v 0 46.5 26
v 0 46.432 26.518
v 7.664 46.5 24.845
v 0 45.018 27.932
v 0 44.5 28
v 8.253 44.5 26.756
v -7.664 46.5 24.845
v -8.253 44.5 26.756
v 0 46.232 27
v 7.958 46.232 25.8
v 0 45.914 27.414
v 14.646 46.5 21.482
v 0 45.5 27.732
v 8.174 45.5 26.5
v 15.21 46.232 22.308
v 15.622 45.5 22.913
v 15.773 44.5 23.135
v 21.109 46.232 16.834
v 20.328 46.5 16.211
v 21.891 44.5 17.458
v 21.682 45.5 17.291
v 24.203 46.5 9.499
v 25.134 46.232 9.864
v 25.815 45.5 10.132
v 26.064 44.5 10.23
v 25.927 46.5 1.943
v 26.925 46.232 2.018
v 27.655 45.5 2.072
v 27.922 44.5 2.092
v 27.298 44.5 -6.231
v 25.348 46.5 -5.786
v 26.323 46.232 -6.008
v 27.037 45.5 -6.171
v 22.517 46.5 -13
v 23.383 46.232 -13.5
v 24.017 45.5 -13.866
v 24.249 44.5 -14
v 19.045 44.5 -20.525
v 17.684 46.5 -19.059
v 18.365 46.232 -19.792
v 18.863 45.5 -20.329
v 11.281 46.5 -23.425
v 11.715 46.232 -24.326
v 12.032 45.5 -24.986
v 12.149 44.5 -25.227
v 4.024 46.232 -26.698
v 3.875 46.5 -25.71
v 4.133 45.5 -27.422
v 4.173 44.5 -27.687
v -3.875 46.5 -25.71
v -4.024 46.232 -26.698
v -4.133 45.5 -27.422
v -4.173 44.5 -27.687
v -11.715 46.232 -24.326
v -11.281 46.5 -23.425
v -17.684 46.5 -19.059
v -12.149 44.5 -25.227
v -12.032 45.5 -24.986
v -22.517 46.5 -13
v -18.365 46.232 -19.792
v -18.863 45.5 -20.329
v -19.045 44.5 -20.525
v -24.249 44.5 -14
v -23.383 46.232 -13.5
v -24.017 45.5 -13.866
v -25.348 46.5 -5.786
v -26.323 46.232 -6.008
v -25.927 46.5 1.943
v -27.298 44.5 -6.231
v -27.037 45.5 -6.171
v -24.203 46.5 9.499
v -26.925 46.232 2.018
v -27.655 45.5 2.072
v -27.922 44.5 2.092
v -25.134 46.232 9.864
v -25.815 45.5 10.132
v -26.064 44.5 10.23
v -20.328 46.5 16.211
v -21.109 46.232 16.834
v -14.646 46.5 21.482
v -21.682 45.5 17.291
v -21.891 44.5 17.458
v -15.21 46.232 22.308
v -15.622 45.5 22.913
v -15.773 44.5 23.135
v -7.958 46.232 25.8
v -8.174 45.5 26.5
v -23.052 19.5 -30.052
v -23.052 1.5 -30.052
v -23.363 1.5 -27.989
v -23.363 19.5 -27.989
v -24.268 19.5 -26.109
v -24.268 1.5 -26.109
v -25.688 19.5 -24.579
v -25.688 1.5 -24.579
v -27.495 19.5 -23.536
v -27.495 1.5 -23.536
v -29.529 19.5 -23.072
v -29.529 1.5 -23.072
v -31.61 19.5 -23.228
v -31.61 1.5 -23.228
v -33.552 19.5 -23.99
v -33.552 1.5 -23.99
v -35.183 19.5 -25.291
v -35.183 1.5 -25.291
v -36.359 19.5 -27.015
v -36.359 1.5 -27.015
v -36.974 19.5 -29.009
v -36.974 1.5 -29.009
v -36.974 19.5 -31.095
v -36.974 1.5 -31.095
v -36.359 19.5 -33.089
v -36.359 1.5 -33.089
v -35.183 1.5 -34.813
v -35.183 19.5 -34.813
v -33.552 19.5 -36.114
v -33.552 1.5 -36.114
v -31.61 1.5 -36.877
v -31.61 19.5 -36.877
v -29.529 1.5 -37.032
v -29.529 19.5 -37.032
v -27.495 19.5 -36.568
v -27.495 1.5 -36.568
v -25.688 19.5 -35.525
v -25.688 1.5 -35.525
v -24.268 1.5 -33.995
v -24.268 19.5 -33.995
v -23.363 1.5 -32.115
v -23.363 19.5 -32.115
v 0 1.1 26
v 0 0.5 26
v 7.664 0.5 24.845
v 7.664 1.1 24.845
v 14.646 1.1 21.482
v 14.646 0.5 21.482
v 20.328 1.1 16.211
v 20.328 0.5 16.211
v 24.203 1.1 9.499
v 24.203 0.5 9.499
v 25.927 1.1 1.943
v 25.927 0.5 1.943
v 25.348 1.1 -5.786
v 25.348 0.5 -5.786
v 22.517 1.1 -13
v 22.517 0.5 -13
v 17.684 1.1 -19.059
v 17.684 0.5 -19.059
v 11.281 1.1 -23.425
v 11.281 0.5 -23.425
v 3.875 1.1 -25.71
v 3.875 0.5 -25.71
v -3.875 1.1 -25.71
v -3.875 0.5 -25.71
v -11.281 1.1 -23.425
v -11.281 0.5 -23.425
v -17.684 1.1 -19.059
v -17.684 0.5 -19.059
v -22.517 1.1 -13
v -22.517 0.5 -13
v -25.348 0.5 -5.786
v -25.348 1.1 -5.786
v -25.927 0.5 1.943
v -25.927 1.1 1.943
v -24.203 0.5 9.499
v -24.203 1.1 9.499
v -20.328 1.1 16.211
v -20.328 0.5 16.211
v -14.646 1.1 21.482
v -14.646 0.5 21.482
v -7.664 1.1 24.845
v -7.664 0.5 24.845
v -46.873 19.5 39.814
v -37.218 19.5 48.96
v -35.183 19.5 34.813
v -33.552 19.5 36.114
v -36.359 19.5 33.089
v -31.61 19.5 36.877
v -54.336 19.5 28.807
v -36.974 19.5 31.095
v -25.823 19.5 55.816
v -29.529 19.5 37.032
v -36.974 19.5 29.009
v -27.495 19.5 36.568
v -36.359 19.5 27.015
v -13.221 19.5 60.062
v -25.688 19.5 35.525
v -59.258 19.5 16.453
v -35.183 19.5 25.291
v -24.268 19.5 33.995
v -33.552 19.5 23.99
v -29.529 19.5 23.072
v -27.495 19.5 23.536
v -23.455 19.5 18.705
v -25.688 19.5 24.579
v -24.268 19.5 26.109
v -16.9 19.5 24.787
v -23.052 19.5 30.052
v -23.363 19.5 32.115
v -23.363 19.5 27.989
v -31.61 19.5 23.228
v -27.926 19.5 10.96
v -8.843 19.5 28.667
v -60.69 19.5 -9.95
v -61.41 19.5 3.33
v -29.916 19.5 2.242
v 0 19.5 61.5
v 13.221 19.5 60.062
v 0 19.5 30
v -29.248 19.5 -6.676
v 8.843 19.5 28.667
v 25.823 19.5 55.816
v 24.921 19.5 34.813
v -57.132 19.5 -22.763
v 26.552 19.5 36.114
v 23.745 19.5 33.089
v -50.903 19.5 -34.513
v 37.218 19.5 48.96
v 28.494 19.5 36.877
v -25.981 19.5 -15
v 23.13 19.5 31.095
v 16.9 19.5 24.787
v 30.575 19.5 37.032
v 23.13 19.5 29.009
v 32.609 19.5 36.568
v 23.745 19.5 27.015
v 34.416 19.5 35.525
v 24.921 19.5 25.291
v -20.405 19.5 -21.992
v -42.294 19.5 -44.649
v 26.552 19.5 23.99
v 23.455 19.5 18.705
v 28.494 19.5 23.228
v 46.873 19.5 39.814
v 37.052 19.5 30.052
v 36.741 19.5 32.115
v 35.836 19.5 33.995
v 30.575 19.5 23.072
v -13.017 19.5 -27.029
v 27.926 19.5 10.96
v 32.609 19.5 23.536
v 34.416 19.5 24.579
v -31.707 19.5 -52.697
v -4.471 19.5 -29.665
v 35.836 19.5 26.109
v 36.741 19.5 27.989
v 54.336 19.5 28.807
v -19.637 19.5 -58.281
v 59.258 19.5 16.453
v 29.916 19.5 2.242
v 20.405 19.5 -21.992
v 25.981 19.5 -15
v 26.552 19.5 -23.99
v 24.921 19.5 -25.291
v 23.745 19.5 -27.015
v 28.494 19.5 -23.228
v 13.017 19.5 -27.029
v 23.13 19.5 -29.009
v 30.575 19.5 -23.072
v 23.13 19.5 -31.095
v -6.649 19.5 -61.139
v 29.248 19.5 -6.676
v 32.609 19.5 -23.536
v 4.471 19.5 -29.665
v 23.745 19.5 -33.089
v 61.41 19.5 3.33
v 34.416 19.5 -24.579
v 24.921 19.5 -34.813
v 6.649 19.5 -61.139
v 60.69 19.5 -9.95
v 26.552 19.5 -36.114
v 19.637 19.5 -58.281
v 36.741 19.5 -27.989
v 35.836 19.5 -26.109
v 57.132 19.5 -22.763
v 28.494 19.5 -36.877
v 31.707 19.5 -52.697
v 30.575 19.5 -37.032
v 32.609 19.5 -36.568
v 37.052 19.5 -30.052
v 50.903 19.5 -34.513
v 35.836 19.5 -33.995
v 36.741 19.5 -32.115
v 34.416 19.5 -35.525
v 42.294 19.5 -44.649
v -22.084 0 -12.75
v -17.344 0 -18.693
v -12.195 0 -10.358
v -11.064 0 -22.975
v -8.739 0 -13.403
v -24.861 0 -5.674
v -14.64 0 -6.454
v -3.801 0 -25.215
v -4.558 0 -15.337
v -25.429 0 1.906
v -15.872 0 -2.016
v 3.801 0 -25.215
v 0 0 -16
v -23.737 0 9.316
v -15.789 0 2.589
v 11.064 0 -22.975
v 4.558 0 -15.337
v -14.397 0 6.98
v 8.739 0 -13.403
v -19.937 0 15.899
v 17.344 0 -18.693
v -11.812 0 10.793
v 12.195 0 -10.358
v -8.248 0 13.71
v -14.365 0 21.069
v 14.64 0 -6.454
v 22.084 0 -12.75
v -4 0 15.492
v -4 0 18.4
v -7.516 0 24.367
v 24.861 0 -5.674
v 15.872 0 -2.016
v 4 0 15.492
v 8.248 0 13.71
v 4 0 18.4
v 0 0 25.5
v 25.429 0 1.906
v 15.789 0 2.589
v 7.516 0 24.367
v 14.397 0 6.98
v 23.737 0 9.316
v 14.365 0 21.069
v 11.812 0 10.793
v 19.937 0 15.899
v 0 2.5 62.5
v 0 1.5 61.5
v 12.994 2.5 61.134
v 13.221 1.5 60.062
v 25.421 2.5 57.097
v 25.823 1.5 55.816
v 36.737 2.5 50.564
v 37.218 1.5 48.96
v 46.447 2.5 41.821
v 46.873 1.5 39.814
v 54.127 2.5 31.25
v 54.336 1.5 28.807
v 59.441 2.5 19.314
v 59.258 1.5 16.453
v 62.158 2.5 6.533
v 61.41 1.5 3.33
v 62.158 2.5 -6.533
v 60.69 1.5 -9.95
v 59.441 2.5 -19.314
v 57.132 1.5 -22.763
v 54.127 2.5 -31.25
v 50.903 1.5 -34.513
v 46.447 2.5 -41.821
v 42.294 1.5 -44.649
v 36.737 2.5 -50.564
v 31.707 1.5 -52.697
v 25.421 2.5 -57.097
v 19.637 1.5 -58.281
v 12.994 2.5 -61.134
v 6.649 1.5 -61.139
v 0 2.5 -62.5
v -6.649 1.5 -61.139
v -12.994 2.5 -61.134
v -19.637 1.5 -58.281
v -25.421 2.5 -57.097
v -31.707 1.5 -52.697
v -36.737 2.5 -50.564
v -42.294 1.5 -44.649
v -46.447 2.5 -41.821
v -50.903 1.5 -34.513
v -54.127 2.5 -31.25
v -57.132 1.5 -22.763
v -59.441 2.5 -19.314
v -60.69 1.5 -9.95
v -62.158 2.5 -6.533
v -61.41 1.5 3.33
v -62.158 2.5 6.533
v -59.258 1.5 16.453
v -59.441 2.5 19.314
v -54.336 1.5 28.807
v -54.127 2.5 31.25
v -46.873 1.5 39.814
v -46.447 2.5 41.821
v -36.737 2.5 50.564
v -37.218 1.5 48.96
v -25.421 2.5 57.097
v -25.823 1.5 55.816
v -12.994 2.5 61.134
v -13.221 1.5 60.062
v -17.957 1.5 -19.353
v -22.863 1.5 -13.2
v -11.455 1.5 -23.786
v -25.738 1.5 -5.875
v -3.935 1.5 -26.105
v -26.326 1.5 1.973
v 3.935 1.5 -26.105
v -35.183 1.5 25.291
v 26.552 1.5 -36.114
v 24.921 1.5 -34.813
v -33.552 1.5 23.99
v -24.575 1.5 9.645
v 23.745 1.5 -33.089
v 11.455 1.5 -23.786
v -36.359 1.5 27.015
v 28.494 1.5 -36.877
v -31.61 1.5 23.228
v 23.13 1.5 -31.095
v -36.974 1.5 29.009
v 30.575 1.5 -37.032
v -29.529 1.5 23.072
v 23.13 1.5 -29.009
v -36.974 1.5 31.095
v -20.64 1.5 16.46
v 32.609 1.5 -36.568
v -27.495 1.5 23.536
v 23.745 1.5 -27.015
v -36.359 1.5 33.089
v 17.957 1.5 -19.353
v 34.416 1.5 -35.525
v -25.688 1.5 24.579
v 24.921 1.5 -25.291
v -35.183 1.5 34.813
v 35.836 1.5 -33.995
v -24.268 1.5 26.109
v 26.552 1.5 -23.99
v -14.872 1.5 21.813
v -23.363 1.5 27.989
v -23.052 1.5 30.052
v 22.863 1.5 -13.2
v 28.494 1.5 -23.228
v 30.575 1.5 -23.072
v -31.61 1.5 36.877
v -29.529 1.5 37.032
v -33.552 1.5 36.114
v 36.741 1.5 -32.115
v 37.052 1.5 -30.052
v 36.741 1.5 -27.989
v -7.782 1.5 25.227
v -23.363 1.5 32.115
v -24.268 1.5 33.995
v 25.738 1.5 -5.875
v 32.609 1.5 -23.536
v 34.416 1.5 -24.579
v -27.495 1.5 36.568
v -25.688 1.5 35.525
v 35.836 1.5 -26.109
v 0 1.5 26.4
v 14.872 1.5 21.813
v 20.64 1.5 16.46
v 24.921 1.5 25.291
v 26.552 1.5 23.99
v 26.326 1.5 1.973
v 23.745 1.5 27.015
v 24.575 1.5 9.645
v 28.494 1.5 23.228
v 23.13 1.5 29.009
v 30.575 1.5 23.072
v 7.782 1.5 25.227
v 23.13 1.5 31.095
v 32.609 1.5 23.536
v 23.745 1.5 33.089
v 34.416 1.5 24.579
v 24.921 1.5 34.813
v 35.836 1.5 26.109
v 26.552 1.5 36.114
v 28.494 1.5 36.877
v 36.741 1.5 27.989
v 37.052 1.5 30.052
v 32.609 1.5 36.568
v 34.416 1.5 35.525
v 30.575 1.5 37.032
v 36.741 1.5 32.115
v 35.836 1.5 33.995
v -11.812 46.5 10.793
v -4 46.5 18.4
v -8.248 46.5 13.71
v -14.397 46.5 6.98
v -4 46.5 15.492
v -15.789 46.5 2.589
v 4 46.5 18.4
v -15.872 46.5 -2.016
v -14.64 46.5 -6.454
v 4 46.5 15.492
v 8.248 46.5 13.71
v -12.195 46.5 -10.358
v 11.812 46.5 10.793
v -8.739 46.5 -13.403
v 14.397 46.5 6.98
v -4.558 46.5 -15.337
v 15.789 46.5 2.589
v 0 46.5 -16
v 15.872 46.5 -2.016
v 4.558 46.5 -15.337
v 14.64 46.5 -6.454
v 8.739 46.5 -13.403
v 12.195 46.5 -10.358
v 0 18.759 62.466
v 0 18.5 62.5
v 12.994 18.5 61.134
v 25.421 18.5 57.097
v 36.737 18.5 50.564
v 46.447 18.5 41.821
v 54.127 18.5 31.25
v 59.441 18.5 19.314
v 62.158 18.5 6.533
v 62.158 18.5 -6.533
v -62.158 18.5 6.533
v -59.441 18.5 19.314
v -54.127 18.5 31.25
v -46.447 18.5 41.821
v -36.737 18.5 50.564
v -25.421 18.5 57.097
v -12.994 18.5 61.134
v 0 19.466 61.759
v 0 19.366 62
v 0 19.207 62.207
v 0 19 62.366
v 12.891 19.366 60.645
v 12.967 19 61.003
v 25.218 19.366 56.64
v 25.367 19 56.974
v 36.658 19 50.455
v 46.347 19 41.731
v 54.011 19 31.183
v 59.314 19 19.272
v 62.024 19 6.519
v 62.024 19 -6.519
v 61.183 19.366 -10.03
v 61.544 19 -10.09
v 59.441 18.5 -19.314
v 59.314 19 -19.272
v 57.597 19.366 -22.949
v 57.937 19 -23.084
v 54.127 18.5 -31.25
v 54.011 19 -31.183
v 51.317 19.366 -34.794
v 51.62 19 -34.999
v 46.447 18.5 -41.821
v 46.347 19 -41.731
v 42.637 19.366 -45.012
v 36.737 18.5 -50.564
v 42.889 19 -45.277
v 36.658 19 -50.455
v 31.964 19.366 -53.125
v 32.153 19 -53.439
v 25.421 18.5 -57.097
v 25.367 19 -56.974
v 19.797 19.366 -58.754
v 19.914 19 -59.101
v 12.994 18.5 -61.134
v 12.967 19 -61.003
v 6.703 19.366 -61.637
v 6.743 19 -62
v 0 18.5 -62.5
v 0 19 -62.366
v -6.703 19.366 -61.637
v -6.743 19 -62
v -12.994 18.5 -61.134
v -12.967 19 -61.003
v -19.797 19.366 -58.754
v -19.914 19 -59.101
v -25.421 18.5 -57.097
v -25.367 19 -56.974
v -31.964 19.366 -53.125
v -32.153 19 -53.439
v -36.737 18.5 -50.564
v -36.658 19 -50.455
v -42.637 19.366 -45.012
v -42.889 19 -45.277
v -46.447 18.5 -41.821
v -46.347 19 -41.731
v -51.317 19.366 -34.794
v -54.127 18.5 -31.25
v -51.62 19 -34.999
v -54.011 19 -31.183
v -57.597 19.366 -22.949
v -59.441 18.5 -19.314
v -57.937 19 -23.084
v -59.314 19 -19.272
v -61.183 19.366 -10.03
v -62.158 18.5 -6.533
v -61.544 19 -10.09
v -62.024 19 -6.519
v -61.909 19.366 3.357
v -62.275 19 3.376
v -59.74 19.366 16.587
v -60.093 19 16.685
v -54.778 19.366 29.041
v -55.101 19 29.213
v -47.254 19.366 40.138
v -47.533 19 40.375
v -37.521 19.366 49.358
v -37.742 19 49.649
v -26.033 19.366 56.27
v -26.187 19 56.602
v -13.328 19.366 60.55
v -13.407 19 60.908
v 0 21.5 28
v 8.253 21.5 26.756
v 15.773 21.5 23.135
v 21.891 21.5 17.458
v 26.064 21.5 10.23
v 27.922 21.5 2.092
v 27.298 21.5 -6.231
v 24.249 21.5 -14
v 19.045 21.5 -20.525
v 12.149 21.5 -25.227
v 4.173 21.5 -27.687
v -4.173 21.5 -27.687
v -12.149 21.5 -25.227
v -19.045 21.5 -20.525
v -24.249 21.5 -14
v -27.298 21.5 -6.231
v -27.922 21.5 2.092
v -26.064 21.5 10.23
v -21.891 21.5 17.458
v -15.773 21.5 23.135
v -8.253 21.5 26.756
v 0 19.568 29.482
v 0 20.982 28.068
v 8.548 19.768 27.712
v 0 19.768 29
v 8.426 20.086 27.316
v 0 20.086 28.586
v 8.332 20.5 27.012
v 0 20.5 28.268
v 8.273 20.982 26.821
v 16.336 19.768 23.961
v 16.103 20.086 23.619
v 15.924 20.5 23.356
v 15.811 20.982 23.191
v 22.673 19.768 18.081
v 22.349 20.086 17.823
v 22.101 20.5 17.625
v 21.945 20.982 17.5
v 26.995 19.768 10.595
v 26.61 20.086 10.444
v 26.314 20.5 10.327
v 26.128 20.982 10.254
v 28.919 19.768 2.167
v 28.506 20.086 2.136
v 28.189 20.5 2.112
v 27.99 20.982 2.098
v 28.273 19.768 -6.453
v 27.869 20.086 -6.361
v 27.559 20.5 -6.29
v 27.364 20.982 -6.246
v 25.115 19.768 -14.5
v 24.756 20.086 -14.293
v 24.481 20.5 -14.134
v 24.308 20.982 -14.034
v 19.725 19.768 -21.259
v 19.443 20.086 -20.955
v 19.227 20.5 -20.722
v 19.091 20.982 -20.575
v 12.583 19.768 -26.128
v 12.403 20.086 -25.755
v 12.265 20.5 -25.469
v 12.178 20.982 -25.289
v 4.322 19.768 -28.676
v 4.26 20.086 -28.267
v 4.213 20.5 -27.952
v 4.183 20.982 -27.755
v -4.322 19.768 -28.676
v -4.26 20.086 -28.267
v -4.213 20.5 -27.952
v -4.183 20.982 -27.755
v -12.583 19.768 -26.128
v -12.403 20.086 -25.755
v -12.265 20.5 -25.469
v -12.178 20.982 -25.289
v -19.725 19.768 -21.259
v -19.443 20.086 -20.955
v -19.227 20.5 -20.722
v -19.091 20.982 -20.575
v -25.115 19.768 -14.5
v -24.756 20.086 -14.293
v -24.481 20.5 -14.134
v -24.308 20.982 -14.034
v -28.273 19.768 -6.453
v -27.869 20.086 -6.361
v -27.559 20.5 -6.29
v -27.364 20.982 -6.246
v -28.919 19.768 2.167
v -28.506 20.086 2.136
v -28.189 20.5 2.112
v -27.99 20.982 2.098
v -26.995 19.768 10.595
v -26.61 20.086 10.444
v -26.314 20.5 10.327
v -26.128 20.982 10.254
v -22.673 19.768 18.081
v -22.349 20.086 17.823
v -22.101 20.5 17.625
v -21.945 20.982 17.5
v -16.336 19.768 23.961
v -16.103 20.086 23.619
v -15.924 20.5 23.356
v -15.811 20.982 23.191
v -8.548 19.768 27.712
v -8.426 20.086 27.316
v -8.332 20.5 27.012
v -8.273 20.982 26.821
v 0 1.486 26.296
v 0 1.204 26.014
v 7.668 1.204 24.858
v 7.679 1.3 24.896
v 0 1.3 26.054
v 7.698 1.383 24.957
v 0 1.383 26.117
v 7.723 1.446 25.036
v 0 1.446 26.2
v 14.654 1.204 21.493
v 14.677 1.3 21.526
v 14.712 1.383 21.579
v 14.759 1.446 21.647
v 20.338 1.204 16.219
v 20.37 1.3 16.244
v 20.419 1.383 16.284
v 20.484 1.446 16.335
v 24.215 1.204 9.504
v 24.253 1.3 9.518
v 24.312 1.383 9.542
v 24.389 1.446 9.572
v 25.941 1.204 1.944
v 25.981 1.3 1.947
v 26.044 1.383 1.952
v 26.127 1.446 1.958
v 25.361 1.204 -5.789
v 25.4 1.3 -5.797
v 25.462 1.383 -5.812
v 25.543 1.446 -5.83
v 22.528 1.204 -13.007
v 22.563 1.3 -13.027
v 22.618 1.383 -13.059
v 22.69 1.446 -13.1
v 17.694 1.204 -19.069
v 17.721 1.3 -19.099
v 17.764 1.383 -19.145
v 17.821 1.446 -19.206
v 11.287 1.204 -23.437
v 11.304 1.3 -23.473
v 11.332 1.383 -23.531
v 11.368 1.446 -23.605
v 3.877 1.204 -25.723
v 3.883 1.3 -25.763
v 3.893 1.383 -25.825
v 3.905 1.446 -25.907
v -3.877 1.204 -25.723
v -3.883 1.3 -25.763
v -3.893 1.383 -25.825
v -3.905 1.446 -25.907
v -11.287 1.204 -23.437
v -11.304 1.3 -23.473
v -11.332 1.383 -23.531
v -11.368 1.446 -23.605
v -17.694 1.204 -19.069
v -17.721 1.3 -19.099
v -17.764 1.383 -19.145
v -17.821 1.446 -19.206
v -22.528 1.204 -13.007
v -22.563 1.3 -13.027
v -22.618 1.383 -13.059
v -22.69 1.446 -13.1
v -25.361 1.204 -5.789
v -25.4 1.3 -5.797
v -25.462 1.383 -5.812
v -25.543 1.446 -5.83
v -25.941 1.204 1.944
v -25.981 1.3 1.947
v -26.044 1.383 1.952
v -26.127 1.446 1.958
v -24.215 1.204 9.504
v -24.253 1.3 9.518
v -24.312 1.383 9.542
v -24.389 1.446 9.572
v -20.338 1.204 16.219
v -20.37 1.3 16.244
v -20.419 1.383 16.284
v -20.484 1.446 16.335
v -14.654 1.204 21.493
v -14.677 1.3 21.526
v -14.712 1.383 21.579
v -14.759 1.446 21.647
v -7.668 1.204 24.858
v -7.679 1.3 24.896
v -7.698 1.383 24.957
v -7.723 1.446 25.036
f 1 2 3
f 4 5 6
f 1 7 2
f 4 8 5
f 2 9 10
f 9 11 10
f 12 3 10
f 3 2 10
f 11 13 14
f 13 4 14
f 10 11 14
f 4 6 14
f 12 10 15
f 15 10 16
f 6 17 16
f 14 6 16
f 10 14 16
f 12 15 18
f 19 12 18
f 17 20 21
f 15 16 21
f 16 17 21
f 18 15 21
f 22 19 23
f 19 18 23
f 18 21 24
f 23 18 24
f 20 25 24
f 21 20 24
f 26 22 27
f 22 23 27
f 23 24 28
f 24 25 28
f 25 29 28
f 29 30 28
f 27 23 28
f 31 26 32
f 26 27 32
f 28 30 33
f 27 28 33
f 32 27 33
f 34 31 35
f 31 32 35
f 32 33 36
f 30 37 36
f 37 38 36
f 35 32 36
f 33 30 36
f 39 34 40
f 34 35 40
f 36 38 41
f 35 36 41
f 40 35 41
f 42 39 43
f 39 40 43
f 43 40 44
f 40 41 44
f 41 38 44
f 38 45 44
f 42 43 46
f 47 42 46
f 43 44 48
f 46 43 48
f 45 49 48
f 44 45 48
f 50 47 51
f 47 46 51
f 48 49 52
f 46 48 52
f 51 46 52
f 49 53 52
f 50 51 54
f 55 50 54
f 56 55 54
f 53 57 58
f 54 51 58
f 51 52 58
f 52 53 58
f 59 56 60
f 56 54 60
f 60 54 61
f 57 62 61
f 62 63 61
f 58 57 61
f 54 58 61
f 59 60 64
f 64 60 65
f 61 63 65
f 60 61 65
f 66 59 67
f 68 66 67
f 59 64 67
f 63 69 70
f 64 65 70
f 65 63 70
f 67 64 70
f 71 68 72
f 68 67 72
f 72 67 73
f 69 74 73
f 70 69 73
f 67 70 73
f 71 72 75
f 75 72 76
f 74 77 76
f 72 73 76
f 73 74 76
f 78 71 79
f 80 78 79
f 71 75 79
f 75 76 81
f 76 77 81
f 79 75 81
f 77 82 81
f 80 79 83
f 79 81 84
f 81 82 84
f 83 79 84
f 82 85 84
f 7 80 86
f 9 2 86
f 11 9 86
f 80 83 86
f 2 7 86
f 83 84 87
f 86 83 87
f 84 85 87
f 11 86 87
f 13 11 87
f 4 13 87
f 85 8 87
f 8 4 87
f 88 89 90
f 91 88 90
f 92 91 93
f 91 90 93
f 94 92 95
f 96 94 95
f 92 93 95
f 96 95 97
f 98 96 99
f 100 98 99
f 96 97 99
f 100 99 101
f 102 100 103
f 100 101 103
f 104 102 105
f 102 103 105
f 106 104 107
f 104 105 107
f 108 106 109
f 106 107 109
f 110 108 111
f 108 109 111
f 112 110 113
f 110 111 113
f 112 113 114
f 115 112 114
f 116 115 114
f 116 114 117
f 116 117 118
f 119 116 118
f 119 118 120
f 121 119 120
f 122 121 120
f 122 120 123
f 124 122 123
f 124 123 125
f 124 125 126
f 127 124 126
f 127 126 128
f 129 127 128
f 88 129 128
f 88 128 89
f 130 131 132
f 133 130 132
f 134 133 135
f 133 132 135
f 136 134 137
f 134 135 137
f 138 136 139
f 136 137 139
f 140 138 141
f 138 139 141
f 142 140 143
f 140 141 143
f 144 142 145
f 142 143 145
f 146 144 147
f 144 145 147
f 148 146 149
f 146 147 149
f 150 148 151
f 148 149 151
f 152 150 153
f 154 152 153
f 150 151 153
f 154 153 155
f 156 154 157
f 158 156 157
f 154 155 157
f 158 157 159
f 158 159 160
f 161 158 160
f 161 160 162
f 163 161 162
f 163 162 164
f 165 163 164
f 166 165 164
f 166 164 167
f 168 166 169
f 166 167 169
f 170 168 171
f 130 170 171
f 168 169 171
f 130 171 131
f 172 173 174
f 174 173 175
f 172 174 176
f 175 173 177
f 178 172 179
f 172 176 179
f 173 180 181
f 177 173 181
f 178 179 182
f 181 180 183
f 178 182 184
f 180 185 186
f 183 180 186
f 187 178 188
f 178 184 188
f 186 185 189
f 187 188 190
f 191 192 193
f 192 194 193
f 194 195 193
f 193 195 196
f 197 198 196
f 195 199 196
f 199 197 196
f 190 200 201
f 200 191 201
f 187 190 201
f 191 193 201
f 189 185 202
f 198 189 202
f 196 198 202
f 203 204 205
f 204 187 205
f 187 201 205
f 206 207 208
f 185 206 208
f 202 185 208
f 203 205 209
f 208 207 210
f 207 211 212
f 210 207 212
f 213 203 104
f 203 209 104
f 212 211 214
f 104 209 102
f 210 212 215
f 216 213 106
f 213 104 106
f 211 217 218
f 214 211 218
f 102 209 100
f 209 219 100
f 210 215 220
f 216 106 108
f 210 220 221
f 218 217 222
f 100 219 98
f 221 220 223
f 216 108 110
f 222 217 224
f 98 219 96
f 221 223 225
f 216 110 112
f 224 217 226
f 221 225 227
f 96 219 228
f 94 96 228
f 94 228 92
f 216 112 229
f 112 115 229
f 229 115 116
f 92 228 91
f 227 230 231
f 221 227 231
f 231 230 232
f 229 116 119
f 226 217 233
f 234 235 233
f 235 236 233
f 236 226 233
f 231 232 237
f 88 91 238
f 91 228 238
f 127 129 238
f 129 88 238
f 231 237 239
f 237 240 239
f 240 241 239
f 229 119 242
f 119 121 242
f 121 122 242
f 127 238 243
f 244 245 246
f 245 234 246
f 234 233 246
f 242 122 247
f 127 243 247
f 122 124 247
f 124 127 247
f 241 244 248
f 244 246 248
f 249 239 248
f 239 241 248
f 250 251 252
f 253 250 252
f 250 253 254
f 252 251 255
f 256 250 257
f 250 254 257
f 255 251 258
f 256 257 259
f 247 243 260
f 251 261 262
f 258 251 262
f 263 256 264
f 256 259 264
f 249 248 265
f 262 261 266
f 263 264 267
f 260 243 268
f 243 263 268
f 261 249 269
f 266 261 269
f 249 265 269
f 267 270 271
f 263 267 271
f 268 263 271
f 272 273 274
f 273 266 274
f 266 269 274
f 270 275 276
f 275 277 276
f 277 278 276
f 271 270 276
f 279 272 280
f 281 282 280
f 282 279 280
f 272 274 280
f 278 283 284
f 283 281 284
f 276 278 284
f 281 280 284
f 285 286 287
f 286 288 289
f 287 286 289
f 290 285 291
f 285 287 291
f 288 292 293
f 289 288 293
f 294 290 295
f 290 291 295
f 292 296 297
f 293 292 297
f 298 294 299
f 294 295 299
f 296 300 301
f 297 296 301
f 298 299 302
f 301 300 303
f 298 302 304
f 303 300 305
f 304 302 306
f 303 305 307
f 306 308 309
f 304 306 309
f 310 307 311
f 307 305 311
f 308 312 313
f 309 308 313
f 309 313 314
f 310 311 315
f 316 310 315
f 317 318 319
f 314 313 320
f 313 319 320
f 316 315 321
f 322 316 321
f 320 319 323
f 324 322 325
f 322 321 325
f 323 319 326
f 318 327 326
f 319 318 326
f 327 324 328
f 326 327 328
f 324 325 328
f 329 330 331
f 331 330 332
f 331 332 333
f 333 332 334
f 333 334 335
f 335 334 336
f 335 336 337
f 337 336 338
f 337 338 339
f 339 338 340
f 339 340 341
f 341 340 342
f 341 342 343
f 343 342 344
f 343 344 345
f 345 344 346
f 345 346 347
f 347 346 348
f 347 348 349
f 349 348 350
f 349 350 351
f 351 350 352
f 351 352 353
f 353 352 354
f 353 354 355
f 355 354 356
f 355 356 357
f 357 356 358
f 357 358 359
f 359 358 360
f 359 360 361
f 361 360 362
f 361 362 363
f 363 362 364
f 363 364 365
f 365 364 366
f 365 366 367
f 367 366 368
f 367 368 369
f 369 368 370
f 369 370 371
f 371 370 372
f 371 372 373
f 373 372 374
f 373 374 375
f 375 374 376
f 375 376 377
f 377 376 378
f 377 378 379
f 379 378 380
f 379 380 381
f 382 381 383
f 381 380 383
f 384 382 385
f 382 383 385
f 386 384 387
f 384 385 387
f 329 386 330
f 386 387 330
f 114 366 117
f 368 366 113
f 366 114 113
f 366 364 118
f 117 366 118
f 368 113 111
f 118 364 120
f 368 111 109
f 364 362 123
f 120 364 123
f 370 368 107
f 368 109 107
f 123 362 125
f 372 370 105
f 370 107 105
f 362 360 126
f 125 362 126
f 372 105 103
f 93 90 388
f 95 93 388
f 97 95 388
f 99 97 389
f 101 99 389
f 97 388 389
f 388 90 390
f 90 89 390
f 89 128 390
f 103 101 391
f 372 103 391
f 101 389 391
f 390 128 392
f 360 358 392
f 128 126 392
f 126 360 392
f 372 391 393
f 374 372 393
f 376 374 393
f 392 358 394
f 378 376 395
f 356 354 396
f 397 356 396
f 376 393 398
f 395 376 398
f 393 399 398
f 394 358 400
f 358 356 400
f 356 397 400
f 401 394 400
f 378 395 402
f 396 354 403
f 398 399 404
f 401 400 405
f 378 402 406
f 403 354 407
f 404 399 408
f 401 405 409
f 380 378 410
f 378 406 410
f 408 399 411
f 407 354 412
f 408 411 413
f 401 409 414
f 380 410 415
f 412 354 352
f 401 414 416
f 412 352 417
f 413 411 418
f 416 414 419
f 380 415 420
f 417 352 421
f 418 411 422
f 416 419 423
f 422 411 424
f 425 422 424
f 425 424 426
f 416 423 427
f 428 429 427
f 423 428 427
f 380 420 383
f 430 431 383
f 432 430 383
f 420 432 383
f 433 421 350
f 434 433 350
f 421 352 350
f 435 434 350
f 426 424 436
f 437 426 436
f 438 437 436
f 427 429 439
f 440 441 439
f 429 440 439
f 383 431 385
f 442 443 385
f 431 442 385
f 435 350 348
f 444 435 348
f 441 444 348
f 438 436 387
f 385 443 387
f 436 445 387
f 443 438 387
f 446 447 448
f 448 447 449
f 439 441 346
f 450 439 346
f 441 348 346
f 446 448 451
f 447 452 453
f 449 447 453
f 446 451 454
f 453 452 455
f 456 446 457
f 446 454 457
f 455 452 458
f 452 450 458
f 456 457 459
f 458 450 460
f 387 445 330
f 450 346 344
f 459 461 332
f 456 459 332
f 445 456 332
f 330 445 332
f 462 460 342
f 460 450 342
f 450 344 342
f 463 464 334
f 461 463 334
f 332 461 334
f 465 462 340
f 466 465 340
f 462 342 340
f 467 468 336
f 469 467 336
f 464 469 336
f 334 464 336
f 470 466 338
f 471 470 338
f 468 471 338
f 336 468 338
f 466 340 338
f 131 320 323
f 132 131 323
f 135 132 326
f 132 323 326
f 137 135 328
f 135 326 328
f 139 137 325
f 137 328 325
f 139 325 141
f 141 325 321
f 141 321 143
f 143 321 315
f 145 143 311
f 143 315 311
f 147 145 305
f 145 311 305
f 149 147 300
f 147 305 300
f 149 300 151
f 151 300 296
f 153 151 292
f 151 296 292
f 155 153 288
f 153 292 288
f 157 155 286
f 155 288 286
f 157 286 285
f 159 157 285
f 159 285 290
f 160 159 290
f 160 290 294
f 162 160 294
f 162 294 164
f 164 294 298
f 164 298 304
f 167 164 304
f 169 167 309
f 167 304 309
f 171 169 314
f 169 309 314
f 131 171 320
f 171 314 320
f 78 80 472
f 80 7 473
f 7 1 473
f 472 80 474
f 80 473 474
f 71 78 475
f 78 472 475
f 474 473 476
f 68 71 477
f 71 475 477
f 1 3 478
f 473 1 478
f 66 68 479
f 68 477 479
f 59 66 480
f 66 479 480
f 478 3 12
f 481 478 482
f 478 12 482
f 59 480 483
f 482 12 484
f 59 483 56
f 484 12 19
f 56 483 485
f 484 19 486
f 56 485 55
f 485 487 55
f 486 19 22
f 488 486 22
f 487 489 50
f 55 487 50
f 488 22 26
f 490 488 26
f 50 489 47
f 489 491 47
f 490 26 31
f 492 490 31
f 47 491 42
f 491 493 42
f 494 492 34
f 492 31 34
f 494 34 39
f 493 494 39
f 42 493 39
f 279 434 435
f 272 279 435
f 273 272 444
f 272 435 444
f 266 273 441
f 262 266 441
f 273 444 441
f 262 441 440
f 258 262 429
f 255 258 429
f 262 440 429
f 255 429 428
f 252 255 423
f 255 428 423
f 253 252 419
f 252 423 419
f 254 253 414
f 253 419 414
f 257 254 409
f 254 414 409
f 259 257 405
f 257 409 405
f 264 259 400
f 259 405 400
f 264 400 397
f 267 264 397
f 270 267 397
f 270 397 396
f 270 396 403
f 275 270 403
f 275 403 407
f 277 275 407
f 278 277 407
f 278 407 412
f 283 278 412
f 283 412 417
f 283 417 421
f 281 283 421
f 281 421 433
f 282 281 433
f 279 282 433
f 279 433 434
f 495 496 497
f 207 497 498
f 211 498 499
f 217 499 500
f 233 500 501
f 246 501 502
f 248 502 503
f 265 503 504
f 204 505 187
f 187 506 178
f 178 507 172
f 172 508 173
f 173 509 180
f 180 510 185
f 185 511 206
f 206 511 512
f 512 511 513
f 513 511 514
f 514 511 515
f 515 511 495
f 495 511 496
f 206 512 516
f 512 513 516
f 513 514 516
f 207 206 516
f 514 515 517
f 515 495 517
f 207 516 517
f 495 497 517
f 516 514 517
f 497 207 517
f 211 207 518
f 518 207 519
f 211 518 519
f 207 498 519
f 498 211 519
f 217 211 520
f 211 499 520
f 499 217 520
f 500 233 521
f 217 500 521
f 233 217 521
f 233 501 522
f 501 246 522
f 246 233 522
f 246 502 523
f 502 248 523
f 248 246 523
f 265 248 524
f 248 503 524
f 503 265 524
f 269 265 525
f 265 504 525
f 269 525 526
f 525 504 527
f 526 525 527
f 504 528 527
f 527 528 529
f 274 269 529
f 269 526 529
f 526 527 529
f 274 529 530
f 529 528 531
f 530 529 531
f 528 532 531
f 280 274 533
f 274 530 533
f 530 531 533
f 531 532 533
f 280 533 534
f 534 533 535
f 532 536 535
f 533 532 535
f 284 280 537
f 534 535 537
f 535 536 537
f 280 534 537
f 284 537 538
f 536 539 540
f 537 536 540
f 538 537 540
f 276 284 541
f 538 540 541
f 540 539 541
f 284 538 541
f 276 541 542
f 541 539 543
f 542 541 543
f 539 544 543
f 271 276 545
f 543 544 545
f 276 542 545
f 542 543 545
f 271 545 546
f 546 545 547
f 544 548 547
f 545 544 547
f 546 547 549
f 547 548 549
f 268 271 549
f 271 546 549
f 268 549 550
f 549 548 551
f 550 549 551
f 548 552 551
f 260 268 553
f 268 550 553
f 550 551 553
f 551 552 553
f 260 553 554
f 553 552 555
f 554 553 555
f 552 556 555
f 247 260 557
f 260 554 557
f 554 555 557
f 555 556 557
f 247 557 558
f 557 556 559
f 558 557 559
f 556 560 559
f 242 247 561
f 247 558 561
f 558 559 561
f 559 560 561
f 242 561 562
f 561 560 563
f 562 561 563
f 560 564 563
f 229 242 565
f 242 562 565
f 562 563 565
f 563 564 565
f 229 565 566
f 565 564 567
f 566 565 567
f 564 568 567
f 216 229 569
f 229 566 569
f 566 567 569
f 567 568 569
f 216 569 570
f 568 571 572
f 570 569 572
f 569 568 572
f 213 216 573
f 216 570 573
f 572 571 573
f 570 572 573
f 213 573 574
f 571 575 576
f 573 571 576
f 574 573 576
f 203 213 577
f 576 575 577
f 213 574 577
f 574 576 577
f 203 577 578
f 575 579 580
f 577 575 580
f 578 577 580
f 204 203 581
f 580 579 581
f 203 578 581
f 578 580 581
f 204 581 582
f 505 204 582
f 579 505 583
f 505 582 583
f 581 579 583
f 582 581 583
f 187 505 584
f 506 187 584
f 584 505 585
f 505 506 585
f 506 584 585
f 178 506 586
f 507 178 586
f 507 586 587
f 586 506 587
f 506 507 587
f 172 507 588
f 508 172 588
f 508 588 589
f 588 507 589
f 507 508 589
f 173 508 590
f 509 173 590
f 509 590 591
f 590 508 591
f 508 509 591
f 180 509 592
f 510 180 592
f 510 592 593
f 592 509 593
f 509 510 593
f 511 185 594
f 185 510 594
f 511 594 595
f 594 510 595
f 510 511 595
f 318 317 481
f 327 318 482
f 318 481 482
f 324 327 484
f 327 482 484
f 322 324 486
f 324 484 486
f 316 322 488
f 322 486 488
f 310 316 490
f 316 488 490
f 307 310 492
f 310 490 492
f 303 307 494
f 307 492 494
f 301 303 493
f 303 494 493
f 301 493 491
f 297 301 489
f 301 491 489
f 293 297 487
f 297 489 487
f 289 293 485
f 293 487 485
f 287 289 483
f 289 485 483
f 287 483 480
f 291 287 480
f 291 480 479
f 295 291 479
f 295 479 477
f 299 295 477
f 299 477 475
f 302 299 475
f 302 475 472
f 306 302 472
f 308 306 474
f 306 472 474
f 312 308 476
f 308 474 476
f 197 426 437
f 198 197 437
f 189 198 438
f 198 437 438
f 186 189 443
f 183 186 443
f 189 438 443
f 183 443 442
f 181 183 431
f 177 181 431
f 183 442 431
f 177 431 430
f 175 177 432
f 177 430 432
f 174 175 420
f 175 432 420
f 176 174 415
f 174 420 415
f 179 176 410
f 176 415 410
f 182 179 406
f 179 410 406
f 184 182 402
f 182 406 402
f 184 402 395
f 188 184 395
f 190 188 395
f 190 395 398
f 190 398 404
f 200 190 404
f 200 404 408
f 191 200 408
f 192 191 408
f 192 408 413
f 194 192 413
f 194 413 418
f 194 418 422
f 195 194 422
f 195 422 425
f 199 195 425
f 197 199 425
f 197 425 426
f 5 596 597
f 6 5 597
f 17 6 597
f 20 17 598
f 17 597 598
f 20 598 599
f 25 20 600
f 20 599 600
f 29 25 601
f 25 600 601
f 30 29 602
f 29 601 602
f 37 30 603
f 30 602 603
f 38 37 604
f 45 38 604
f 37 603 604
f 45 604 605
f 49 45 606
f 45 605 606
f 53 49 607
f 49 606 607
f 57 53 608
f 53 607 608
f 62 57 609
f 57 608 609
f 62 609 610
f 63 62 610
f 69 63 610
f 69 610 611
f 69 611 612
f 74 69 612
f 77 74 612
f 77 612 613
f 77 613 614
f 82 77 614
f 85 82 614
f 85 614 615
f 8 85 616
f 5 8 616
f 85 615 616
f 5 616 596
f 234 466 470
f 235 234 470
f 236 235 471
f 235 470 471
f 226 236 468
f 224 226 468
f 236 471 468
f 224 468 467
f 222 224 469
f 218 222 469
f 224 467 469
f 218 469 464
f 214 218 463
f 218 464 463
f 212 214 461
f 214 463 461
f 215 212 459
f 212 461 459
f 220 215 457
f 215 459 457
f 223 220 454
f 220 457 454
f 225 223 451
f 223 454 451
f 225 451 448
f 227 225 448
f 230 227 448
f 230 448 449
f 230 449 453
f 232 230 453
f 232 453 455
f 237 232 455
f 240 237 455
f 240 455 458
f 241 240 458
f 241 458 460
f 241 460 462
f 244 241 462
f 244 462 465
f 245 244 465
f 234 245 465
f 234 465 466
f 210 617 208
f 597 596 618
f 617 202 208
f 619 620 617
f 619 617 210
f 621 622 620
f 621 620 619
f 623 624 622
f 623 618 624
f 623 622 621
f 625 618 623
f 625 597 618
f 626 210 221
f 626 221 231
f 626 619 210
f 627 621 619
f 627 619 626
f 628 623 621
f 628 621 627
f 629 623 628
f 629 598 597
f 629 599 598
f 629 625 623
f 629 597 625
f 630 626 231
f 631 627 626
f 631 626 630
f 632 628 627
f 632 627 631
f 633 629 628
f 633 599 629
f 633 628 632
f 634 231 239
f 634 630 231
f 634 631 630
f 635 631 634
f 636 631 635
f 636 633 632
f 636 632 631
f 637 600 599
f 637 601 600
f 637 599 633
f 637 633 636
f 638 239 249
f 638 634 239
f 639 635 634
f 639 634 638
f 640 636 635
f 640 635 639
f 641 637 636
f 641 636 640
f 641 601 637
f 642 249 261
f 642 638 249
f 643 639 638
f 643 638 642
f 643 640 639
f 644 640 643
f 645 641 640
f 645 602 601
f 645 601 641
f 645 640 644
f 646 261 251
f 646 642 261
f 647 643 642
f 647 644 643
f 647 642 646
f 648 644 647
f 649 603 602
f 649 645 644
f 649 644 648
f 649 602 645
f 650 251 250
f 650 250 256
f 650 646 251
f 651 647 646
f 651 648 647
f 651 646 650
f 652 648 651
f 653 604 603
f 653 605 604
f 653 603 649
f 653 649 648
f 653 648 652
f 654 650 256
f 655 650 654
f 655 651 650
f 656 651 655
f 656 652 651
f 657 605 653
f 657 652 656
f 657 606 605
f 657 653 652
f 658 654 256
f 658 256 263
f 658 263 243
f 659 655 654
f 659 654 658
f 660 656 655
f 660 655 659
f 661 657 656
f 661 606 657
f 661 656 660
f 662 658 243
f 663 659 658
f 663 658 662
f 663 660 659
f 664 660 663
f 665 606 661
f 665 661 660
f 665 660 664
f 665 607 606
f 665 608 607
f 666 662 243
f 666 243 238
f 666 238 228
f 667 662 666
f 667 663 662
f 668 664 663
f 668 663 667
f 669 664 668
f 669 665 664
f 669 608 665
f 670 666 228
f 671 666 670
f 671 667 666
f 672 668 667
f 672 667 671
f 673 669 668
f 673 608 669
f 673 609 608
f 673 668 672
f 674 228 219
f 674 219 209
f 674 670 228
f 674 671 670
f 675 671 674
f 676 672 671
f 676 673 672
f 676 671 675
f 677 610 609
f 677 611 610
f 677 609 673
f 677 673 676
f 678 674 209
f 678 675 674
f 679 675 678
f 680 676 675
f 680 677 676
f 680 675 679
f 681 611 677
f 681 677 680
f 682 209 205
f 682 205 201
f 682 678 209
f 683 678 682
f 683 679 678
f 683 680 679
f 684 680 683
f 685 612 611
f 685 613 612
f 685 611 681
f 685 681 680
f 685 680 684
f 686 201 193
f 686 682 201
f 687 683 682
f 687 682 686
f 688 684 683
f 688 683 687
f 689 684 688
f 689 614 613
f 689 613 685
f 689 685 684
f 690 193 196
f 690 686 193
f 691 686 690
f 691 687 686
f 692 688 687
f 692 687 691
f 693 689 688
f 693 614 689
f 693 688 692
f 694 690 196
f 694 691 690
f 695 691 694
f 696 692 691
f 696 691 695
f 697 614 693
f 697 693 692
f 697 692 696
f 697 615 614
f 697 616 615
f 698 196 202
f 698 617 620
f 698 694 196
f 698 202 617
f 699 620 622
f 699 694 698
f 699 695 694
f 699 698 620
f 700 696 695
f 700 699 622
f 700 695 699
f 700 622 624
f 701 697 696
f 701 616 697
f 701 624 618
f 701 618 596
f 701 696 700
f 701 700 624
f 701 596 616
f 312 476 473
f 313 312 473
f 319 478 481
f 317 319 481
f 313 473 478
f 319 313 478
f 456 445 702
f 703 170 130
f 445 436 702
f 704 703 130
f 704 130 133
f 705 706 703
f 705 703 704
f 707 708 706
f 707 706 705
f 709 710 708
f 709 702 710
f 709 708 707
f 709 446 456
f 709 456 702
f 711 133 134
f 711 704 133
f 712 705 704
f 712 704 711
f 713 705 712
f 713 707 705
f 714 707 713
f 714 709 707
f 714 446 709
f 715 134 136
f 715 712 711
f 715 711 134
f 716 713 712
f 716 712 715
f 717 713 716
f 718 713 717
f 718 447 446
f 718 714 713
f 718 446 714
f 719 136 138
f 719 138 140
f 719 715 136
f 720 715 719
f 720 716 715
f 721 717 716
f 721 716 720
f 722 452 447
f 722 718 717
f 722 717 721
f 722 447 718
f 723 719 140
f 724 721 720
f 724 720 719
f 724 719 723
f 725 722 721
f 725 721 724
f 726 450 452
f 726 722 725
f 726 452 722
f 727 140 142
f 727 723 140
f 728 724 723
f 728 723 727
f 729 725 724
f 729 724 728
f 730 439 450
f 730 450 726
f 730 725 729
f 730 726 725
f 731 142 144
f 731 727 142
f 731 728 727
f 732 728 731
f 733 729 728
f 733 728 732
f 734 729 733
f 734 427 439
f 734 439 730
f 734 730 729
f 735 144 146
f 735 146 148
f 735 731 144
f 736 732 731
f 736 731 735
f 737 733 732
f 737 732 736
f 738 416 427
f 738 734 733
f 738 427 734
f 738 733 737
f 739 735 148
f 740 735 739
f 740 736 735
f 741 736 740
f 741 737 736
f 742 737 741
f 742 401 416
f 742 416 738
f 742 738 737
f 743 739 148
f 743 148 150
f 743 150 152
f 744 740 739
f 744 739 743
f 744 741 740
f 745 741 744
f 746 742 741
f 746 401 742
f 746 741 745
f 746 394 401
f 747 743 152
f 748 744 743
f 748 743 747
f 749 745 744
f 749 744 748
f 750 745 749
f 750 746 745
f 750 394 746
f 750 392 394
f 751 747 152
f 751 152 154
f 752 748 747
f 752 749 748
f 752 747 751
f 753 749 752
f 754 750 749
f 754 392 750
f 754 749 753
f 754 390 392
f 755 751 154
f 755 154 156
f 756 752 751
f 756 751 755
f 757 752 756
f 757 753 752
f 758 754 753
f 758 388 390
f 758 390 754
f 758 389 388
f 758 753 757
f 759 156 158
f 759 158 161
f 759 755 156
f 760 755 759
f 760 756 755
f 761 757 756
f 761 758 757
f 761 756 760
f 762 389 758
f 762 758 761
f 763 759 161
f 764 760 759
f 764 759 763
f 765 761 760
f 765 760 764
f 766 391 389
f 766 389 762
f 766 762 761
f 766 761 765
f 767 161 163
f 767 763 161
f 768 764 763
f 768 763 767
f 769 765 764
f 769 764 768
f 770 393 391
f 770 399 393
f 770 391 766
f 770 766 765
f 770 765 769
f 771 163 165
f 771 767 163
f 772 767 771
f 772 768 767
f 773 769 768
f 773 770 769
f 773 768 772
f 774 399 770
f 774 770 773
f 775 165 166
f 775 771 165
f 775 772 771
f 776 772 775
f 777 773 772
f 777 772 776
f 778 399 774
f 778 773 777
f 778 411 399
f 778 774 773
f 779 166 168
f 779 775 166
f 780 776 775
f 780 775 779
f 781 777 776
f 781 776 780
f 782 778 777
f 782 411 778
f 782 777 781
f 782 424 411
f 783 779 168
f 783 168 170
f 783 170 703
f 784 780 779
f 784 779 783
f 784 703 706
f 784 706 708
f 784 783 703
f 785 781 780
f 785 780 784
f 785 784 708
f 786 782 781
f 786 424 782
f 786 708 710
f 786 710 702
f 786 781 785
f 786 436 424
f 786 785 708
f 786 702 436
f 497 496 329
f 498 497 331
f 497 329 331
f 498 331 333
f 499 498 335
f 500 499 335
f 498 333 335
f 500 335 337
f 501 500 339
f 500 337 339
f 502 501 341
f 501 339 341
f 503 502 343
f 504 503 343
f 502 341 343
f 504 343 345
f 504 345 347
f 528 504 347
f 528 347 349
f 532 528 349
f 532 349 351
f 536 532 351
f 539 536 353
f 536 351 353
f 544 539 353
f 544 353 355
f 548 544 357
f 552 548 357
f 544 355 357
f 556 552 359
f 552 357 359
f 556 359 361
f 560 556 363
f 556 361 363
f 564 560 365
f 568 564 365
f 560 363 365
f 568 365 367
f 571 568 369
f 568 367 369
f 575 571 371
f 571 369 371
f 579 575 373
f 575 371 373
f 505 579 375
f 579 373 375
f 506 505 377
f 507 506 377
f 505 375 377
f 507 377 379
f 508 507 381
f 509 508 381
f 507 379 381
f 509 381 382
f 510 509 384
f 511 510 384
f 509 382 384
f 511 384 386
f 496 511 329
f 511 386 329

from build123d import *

# Parameters (mm, degrees)
F3_DEPTH = 46.501
F5_D     = 14
F6_R     = 2
F7_R     = 1
F8_SIZE  = 1
F9_SIZE  = 0.5
F10_R    = 0.4


with BuildPart() as f1:
    # F0 (on Right) → F1 (revolve)
    with BuildSketch(Plane.YZ):
        Polygon((1.5, 26), (0, 26), (0, 16), (46.5, 16), (46.5, 28), (19.5, 28), (19.5, 62.5), (1.5, 62.5), align=None)
    revolve(axis=Axis((0, 26.823761, 0), (0, 1, 0)))

    # F2 (on face) → F3 (cut, through all)
    with BuildSketch(Plane(origin=(0, 46.5, 0), x_dir=(-1, 0, 0), z_dir=(0, 1, 0))):
        with BuildLine():
            ThreePointArc((4, 15.491933), (0, 16), (-4, 15.491933))
            Line((-4, 15.491933), (-4, 12))
            Line((-4, 12), (4, 12))
            Line((4, 12), (4, 15.491933))
        make_face()
        with BuildLine():
            Line((4, 18.4), (-4, 18.4))
            Line((-4, 18.4), (-4, 15.491933))
            ThreePointArc((-4, 15.491933), (0, 16), (4, 15.491933))
            Line((4, 15.491933), (4, 18.4))
        make_face()
    extrude(amount=-F3_DEPTH, mode=Mode.SUBTRACT)

    # F5 (through all)
    with Locations(Plane(origin=(0, 19.5, 0), x_dir=(-1, 0, 0), z_dir=(0, 1, 0))):
        with Locations((-30.052038, 30.052038), (30.052038, 30.052038), (-30.052038, -30.052038), (30.052038, -30.052038)):
            Hole(F5_D / 2)

    # F6
    f6_edges = [f1.edges().sort_by_distance(p)[0] for p in [
        (0, 19.5, -28),
        (0, 46.5, -28),
    ]]
    fillet(f6_edges, radius=F6_R)

    # F7
    f7_edges = [f1.edges().sort_by_distance(p)[0] for p in [
        (0, 19.5, -62.5),
    ]]
    fillet(f7_edges, radius=F7_R)

    # F8
    f8_edges = [f1.edges().sort_by_distance(p)[0] for p in [
        (0, 1.5, -62.5),
    ]]
    chamfer(f8_edges, length=F8_SIZE)

    # F9
    f9_edges = [f1.edges().sort_by_distance(p)[0] for p in [
        (0, 0, -26),
    ]]
    chamfer(f9_edges, length=F9_SIZE)

    # F10
    f10_edges = [f1.edges().sort_by_distance(p)[0] for p in [
        (0, 1.5, -26),
    ]]
    fillet(f10_edges, radius=F10_R)


solid = f1.part
